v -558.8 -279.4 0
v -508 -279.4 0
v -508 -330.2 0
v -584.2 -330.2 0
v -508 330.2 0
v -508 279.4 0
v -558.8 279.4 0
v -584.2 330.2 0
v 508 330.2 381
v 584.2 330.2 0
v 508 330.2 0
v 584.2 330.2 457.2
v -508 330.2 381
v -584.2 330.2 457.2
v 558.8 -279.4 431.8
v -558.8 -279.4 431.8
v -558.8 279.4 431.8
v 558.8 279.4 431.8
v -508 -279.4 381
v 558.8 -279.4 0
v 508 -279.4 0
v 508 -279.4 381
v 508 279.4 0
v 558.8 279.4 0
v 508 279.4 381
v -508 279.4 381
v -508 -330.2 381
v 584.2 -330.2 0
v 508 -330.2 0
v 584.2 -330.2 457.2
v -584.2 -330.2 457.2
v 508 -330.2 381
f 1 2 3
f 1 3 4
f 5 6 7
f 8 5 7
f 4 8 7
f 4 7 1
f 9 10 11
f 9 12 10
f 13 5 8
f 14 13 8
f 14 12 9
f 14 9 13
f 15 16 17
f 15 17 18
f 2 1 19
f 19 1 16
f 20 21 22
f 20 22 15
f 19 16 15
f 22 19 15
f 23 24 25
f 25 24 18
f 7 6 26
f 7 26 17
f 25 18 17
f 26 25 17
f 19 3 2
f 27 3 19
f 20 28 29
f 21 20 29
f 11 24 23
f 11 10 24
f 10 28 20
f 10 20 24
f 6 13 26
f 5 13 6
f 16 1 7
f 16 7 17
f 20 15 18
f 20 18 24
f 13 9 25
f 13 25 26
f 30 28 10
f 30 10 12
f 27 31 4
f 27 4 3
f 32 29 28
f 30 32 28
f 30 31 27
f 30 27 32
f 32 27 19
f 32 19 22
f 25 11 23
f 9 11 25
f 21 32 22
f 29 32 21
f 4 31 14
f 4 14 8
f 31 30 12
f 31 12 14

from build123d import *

# Parameters (mm, degrees)
F1_DEPTH = 330.2
F3_DEPTH = 50.8
F5_DEPTH = 50.8


with BuildPart() as f1:
    # F0 (on Front) → F1 (new body, symmetric)
    with BuildSketch(Plane.XZ):
        Polygon((-584.2, 457.2), (-584.2, 0), (-558.8, 0), (-558.8, 431.8), (558.8, 431.8), (558.8, 0), (584.2, 0), (584.2, 457.2), align=None)
    extrude(amount=F1_DEPTH, both=True)

    # F2 (on face) → F3 (join)
    with BuildSketch(Plane(origin=(0, 330.2, 0), x_dir=(-1, 0, 0), z_dir=(0, 1, 0))):
        Polygon((-558.8, 431.8), (-558.8, 0), (-508, 0), (-508, 381), (508, 381), (508, 0), (558.8, 0), (558.8, 431.8), align=None)
    extrude(amount=-F3_DEPTH)

    # F4 (on face) → F5 (join)
    with BuildSketch(Plane.XZ.offset(330.2)):
        Polygon((-584.2, 457.2), (-584.2, 0), (-508, 0), (-508, 381), (508, 381), (508, 0), (584.2, 0), (584.2, 457.2), align=None)
    extrude(amount=-F5_DEPTH)


solid = f1.part
